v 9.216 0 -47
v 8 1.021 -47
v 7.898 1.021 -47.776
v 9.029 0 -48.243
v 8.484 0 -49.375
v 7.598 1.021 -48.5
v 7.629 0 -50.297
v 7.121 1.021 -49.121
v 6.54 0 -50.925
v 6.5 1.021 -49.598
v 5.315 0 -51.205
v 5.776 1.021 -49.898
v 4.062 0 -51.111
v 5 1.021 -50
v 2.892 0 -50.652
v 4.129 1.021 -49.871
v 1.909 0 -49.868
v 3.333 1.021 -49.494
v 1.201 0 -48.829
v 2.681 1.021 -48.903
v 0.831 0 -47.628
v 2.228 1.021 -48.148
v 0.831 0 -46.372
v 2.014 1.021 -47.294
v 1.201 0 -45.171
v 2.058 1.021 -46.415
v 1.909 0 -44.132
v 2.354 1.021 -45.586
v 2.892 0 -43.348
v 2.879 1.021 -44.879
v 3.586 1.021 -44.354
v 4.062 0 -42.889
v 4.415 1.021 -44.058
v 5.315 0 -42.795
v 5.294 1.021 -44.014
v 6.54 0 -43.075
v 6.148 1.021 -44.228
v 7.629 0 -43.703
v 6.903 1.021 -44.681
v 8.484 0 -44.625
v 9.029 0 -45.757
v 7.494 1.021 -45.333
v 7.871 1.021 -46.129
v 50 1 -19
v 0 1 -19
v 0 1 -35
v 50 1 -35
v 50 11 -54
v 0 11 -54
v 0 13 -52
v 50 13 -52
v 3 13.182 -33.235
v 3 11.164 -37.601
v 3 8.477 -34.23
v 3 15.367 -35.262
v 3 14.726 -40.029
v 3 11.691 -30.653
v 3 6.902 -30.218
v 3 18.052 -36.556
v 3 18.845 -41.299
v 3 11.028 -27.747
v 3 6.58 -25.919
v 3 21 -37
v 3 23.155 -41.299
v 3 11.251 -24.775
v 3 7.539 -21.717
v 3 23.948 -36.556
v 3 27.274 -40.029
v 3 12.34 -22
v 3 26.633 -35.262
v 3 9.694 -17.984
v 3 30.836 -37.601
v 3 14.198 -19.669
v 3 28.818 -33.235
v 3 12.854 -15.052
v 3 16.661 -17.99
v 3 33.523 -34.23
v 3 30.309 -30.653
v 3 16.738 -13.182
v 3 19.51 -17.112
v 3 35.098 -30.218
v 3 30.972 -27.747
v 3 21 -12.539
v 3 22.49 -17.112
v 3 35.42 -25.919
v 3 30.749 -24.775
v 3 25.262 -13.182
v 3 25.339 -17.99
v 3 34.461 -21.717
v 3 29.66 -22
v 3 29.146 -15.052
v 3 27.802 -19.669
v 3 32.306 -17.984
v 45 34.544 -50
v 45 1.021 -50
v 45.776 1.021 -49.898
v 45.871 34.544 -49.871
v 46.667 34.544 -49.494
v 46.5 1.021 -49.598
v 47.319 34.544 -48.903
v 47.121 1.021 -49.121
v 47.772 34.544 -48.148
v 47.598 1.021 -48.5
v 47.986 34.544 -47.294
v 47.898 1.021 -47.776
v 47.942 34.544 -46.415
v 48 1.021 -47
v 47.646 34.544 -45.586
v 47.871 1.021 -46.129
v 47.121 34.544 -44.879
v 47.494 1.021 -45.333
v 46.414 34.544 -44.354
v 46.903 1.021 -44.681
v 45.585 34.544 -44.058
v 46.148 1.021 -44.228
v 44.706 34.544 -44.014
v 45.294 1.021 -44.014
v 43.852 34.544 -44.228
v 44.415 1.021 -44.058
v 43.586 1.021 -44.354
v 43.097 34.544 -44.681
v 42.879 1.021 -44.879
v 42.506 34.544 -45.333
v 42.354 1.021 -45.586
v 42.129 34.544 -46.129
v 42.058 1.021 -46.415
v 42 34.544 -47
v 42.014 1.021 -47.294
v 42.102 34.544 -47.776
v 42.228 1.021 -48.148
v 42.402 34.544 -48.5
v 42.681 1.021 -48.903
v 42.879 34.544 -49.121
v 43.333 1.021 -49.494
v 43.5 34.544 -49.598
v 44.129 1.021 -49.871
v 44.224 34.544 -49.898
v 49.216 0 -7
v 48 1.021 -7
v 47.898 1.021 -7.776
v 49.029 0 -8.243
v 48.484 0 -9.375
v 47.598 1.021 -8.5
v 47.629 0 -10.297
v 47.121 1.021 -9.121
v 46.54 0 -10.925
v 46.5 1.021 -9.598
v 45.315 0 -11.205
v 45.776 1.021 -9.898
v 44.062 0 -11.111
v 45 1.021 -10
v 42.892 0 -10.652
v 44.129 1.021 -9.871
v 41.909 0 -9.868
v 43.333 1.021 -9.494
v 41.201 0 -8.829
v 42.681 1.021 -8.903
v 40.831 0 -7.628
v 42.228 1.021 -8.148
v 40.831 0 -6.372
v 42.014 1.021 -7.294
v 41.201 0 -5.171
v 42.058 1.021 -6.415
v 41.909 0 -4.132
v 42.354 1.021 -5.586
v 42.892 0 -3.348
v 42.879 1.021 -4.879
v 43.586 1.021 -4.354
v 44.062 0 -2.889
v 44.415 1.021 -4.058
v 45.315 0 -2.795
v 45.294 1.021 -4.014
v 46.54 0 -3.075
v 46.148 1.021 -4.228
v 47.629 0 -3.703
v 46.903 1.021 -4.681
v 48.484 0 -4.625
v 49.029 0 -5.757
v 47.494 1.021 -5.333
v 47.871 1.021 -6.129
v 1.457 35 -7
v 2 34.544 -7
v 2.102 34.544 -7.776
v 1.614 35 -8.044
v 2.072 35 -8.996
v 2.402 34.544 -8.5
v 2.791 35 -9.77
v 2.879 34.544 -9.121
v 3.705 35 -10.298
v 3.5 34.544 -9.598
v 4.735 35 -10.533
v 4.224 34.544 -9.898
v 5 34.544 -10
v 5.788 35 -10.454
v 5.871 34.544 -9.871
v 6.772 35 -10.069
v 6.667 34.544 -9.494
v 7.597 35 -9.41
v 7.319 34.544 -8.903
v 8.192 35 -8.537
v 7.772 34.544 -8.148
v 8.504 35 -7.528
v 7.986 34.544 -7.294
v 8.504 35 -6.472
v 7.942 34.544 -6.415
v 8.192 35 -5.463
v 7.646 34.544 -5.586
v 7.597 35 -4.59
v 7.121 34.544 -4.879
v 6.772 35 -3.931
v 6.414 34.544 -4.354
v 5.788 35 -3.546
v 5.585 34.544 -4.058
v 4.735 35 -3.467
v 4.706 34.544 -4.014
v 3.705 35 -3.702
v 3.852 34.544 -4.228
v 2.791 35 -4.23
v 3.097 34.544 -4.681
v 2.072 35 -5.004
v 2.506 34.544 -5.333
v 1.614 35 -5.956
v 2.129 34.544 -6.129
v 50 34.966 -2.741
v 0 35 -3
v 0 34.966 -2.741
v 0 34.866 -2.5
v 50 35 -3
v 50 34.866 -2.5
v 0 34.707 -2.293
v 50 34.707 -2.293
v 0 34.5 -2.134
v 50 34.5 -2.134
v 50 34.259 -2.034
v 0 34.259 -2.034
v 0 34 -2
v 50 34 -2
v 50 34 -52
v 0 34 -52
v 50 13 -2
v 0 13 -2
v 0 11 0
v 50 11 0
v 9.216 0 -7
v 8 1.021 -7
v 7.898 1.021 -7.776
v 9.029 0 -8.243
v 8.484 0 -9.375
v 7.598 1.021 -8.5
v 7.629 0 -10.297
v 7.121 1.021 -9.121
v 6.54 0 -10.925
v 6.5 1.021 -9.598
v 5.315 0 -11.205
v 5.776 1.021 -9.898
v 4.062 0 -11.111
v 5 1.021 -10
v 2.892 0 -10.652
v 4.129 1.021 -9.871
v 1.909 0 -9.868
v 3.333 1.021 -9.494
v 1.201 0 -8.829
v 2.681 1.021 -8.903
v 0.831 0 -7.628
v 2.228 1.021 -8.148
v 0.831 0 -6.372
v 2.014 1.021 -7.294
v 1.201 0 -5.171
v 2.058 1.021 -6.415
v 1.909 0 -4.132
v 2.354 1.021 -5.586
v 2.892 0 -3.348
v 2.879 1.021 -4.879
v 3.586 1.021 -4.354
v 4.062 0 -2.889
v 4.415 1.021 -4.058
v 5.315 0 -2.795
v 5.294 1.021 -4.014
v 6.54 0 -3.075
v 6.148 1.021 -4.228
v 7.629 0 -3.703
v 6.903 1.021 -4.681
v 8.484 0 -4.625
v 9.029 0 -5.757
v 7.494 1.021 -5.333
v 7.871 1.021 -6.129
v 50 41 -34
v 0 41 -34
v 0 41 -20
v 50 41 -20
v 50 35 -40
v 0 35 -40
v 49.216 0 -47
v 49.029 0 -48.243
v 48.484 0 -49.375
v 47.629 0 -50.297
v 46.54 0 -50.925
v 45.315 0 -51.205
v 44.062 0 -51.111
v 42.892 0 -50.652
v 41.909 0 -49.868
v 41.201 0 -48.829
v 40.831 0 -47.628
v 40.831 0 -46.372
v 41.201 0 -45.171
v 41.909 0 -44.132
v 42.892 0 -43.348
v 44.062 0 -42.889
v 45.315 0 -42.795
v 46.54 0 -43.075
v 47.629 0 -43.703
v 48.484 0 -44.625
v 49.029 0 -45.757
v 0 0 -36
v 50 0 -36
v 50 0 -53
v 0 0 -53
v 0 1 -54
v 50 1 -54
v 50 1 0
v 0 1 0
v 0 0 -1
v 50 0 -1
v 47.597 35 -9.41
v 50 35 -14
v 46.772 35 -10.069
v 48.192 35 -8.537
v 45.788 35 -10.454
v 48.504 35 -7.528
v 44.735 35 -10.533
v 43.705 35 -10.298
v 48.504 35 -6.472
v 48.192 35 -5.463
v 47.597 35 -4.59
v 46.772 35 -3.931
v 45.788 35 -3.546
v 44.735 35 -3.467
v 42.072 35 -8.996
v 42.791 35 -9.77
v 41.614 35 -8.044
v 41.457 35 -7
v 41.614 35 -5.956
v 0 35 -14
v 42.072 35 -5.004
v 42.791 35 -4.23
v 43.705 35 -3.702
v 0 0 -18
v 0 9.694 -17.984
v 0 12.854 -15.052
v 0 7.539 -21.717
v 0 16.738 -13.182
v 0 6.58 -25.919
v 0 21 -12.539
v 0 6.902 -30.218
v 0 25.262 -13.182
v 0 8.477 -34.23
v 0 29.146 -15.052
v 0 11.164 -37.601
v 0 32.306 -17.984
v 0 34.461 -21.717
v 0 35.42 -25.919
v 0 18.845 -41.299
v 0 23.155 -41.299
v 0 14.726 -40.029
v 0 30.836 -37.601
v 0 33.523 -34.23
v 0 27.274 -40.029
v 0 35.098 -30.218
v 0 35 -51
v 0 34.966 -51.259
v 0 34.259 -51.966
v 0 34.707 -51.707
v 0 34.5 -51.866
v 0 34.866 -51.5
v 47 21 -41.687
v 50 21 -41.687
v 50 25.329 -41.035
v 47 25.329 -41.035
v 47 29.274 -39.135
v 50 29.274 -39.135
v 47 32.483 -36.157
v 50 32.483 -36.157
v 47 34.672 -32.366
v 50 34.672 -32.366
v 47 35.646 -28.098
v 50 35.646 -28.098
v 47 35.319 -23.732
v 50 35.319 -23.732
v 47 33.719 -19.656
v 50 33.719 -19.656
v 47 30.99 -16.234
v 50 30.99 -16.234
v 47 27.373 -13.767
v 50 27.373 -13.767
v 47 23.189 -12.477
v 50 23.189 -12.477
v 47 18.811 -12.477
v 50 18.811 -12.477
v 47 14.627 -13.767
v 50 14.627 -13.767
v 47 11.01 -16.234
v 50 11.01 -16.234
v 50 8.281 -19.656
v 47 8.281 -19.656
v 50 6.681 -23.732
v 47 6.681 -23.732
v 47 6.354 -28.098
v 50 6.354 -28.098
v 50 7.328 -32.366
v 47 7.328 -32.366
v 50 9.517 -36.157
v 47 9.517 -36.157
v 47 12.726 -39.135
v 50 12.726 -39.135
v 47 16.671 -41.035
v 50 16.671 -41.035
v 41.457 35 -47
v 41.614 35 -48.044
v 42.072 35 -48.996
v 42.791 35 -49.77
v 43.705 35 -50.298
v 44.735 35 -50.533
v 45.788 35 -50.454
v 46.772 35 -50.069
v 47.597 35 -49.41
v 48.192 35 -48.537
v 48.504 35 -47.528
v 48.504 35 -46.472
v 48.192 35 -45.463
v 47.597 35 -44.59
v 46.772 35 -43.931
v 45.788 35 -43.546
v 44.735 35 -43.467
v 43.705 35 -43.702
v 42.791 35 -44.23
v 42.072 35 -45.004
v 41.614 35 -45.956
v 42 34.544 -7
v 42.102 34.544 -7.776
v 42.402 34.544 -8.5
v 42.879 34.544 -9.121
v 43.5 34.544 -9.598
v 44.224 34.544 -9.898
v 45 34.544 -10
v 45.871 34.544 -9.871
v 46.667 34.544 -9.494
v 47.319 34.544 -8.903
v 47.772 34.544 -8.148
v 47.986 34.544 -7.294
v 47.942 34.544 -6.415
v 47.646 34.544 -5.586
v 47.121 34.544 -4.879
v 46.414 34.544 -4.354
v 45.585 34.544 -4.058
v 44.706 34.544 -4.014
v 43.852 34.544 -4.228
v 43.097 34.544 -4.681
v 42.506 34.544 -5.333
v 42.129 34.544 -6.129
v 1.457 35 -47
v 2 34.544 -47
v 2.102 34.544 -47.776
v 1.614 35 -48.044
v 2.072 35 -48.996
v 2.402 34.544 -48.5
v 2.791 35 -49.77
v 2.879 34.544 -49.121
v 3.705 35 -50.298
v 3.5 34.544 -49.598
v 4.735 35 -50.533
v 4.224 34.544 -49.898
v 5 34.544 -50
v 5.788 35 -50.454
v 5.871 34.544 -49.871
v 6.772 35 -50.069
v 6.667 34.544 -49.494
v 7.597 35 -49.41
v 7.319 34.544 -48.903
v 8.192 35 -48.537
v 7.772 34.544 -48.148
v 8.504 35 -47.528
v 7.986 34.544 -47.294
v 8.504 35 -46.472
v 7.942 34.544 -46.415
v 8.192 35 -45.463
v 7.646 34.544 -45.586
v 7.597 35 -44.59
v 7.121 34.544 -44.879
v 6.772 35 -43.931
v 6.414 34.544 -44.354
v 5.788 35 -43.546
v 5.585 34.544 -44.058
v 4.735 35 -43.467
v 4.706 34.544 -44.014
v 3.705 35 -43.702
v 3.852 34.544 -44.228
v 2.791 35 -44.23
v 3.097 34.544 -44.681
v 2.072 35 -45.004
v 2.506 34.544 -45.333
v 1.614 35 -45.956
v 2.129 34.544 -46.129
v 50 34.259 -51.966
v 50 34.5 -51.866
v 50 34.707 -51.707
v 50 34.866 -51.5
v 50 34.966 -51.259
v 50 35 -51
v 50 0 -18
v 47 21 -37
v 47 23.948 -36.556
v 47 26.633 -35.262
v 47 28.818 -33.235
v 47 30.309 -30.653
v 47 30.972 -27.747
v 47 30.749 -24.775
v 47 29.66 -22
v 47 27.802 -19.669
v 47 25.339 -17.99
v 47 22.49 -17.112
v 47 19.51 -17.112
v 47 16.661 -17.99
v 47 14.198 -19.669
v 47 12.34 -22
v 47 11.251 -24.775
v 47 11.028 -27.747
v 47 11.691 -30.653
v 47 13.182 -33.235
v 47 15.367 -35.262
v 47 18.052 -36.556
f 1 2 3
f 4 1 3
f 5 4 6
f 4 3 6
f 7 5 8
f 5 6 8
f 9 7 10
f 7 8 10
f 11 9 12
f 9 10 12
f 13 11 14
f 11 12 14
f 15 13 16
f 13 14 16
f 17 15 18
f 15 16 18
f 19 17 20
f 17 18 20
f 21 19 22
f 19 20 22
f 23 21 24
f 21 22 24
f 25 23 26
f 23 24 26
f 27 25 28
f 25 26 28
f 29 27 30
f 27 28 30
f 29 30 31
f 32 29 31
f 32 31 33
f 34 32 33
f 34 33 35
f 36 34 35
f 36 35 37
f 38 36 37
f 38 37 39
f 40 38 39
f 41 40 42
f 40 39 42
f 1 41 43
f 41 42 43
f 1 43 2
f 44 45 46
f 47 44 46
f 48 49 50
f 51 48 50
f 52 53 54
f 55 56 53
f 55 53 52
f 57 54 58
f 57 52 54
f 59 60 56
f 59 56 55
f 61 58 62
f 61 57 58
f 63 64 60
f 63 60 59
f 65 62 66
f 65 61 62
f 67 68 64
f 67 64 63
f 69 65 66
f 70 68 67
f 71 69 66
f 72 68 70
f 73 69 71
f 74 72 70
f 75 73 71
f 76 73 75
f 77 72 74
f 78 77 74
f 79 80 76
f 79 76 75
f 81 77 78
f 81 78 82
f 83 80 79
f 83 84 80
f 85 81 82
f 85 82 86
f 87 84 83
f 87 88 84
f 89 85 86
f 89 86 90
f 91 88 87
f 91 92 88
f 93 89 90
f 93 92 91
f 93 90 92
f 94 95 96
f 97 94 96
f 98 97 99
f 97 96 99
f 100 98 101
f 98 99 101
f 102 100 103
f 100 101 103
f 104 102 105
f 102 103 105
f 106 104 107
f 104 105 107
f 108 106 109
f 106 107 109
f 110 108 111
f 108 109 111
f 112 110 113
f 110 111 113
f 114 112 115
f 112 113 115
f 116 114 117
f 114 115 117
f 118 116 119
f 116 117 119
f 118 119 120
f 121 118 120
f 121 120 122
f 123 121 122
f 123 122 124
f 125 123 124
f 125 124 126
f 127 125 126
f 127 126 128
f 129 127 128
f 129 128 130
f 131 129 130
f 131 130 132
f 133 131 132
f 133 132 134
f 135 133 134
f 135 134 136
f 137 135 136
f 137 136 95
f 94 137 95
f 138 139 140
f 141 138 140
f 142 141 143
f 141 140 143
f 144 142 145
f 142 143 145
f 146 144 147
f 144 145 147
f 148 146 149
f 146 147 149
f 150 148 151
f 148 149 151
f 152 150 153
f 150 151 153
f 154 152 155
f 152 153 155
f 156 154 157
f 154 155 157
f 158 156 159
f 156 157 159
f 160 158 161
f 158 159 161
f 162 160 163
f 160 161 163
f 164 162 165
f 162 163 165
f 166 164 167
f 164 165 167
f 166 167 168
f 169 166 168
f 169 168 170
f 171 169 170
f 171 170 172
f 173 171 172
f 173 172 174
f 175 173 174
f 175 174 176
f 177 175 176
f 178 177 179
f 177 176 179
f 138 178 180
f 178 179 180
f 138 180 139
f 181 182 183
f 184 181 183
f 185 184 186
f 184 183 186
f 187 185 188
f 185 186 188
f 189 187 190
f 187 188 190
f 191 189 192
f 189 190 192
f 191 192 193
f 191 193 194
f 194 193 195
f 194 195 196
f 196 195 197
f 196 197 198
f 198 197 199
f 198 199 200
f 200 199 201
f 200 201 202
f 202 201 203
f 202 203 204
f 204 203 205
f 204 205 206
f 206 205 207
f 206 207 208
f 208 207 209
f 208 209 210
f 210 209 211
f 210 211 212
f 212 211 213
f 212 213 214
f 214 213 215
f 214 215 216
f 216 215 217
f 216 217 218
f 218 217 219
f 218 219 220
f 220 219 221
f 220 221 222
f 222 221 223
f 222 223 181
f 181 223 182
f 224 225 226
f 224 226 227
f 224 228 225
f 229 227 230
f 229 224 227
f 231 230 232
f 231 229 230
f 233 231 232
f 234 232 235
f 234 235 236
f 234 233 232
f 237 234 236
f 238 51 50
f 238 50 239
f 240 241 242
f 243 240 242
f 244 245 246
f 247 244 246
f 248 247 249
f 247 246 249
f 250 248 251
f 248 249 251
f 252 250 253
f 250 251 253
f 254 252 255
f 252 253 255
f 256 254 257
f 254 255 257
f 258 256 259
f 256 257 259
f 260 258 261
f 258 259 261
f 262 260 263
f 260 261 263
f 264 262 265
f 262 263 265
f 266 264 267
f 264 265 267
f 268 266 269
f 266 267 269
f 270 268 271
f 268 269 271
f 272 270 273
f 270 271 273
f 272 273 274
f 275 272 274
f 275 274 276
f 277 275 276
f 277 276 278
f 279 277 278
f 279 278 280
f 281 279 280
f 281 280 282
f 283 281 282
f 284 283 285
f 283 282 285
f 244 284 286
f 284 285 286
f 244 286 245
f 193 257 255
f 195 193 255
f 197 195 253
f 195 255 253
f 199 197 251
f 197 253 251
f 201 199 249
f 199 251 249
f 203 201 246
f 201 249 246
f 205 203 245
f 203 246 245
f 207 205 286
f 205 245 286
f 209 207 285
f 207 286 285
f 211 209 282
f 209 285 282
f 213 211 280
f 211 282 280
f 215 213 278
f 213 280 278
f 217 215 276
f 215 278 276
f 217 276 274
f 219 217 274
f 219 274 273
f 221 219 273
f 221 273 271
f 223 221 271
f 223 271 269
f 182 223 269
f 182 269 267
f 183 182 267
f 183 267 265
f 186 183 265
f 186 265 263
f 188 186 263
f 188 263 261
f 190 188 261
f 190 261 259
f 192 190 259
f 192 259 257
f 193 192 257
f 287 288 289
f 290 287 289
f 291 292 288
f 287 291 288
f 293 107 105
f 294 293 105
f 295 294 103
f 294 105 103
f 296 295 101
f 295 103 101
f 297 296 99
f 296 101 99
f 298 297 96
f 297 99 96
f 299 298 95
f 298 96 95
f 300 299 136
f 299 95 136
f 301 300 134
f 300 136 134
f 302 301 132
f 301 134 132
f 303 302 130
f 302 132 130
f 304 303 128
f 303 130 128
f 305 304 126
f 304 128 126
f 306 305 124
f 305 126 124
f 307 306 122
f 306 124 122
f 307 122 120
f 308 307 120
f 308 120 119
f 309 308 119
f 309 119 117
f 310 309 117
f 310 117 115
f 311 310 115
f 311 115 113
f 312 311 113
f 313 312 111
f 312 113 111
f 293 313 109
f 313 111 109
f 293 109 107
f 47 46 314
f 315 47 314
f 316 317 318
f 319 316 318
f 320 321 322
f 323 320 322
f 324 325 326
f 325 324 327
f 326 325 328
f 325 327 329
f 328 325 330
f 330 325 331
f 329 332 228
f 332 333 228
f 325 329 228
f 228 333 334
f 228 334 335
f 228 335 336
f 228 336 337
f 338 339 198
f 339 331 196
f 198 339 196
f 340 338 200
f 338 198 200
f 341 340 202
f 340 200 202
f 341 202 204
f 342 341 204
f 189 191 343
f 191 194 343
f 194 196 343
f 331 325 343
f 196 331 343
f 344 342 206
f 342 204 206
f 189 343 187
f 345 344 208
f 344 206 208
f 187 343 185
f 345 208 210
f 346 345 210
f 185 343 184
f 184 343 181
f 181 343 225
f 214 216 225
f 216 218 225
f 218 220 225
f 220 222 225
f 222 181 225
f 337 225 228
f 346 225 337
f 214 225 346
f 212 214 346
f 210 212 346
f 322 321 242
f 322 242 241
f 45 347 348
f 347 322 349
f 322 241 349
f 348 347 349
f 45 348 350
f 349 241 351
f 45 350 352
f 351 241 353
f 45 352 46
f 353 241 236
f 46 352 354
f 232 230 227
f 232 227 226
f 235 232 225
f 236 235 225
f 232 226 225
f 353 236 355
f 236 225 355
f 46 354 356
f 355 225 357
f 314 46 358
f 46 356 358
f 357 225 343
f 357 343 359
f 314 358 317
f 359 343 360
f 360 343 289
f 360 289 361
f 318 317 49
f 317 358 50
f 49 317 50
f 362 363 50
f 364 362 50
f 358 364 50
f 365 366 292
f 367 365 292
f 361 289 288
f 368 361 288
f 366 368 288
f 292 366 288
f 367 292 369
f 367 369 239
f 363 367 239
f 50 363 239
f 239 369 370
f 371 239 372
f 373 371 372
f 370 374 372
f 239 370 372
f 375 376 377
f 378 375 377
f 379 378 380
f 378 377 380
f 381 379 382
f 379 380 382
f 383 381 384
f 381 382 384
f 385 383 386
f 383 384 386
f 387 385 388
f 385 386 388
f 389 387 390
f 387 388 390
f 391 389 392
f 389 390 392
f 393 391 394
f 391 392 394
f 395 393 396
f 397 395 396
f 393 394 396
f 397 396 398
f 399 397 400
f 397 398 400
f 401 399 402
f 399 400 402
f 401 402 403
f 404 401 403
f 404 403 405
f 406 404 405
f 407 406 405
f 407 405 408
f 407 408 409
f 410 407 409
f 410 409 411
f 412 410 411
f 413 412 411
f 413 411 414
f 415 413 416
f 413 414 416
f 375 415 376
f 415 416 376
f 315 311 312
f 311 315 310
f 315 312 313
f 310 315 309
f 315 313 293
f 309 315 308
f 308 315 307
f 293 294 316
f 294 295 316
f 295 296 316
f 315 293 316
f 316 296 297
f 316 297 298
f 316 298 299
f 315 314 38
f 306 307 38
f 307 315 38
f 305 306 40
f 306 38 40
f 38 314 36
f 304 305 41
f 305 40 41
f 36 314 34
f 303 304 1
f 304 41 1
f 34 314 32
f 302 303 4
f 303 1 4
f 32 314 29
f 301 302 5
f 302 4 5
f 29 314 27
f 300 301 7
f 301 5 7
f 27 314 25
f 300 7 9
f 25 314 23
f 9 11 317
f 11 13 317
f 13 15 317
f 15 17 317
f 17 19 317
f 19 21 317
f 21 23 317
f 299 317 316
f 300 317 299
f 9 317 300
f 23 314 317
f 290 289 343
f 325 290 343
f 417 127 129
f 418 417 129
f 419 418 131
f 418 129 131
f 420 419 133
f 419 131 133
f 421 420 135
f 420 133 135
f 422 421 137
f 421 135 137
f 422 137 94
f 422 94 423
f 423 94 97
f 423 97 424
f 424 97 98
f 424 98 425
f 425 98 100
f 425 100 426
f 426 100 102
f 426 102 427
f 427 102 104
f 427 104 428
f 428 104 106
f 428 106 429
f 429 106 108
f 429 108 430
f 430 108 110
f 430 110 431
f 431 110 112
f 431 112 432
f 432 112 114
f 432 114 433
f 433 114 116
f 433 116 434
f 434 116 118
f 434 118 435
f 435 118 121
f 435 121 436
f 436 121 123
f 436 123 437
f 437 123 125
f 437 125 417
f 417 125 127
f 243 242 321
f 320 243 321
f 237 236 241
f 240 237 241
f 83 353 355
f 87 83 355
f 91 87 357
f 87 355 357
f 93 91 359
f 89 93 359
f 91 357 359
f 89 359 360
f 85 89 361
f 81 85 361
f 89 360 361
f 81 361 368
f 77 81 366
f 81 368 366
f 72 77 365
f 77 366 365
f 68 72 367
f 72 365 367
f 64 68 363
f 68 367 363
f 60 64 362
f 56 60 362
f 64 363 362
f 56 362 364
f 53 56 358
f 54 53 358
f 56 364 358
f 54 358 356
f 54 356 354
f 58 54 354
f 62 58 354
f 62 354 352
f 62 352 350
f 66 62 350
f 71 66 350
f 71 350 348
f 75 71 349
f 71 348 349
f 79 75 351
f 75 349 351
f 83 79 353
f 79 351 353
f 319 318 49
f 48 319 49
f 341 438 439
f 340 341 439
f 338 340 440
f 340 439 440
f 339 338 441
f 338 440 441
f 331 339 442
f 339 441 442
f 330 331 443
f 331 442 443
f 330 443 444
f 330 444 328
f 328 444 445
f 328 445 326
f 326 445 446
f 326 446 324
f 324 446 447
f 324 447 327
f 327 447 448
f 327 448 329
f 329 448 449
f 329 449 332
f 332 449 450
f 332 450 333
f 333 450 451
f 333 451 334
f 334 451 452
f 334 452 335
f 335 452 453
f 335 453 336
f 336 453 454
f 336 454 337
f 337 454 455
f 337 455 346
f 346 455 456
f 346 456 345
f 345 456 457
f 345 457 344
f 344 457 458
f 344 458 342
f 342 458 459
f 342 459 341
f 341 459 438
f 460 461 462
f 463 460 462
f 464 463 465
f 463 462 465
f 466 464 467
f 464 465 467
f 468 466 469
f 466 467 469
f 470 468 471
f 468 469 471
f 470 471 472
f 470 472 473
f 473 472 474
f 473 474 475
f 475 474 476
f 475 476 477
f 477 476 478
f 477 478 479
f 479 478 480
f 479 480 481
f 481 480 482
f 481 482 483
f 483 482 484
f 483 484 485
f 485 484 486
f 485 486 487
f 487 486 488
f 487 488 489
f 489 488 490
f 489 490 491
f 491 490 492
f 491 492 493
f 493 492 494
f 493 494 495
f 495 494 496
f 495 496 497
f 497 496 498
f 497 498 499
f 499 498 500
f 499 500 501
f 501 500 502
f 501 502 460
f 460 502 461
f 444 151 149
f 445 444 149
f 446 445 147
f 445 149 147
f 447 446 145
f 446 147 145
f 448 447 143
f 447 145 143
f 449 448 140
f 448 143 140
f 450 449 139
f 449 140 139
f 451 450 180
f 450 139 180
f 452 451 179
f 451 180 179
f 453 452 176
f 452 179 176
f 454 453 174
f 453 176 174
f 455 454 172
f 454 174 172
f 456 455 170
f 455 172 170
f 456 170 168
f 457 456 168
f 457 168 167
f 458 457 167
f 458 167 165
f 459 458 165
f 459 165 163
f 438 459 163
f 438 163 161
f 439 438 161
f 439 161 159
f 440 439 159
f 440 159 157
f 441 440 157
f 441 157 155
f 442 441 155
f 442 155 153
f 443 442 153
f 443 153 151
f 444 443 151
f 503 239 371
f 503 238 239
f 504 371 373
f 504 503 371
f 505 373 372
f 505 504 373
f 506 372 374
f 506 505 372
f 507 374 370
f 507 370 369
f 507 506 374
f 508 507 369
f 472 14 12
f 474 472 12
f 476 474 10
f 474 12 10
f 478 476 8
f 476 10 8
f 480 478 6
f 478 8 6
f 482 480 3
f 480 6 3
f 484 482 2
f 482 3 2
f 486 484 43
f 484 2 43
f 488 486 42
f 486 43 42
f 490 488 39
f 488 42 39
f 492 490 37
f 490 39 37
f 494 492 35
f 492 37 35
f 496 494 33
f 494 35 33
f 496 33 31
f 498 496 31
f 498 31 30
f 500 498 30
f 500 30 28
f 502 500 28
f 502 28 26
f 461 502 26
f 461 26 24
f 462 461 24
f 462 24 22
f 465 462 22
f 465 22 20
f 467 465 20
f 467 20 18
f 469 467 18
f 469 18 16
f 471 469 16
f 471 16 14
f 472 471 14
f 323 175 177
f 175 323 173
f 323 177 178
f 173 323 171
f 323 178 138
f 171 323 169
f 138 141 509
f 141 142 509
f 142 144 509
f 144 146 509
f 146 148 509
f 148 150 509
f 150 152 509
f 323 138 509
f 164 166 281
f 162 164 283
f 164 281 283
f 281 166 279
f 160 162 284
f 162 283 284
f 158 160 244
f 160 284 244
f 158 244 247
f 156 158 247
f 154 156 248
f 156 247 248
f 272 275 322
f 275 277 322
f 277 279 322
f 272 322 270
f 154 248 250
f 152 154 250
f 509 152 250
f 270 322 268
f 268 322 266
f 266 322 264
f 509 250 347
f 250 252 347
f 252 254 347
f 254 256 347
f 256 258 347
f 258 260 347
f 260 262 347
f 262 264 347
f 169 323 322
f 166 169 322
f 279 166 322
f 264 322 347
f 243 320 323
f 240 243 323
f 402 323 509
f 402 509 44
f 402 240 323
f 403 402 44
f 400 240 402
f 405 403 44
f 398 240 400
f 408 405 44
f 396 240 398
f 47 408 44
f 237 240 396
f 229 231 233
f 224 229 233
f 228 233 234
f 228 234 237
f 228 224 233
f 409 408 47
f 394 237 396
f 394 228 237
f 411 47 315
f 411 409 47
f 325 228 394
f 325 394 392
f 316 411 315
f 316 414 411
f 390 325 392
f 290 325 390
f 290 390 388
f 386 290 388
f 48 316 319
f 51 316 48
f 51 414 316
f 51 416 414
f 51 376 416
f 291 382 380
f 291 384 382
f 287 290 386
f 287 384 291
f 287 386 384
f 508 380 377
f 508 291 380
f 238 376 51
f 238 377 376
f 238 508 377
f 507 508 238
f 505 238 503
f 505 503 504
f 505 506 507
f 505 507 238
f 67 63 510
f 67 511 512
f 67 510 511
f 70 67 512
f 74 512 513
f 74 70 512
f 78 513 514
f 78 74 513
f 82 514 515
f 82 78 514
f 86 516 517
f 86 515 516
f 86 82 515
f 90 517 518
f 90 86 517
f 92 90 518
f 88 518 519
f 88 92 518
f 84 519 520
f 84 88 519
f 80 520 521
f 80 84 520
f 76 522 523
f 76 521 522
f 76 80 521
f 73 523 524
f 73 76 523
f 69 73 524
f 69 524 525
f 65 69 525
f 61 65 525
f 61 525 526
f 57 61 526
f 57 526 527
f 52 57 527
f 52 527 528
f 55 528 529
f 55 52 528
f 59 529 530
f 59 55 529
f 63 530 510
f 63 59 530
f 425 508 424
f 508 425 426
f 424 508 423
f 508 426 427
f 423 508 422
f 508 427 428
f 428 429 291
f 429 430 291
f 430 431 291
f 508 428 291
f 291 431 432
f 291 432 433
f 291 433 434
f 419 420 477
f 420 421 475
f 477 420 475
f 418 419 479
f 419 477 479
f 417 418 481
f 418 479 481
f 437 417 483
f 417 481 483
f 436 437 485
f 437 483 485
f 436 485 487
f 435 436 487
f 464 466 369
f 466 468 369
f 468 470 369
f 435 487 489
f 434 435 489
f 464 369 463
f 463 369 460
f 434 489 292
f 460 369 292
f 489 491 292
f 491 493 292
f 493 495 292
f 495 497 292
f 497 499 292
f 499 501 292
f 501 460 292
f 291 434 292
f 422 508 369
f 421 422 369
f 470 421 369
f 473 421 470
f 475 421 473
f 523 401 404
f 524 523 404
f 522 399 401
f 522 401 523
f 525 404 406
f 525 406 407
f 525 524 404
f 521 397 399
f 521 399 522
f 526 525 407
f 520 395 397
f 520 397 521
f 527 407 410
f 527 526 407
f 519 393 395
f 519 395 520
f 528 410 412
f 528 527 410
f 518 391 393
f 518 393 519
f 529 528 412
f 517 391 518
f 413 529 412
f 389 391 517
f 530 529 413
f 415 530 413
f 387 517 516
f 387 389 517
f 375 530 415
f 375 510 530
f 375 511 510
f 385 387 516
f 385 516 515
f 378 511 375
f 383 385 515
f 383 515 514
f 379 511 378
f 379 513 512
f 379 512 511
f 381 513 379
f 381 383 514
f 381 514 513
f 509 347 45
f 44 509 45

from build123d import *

# Parameters (mm, degrees)
SKETCH1_R                                         = 10
BOSS_EXTRUDE1_DEPTH                               = 50
FILLET1_R                                         = 1
SKETCH2_R                                         = 3
CUT_EXTRUDE1_DEPTH                                = 50
SKETCH3_R                                         = 3
CUT_EXTRUDE2_DEPTH                                = 85.243694126
CSK_FOR_8_FLAT_HEAD_MACHINE_SCREW_100_D           = 4.4958
CSK_FOR_8_FLAT_HEAD_MACHINE_SCREW_100_CSINK_D     = 8.4328
CSK_FOR_8_FLAT_HEAD_MACHINE_SCREW_100_CSINK_ANGLE = 100
CSK_FOR_6_FLAT_HEAD_MACHINE_SCREW_100_D           = 3.7973
CSK_FOR_6_FLAT_HEAD_MACHINE_SCREW_100_CSINK_D     = 7.0866
CSK_FOR_6_FLAT_HEAD_MACHINE_SCREW_100_CSINK_ANGLE = 100
SKETCH14_R                                        = 14.687199229
CUT_EXTRUDE3_DEPTH                                = 3
SKETCH15_R                                        = 14.460805981
CUT_EXTRUDE4_DEPTH                                = 3


with BuildPart() as part:
    # Sketch1 → Boss-Extrude1 (new body)
    with BuildSketch(Plane(origin=(0, 0, 0), x_dir=(0, 0, -1), z_dir=(1, 0, 0))):
        Polygon((53, 0), (54, 1), (54, 11), (52, 13), (52, 35), (40, 35), (34, 41), (20, 41), (14, 35), (2, 35), (2, 13), (0, 11), (0, 1), (1, 0), (18, 0), (19, 1), (35, 1), (36, 0), align=None)
        with Locations((27, 21)):
            Circle(SKETCH1_R, mode=Mode.SUBTRACT)
    extrude(amount=BOSS_EXTRUDE1_DEPTH)

    # Fillet1
    fillet1_edges = [part.edges().sort_by_distance(p)[0] for p in [
        (25, 35, -2),
        (25, 35, -52),
    ]]
    fillet(fillet1_edges, radius=FILLET1_R)

    # Sketch2 → Cut-Extrude1 (cut)
    with BuildSketch(Plane.XZ):
        with Locations(Location((5, -7, 0), (0, 0, 270))):
            Circle(SKETCH2_R)
        with Locations(Location((45, -7, 0), (0, 0, 270))):
            Circle(SKETCH2_R)
    extrude(amount=-CUT_EXTRUDE1_DEPTH, mode=Mode.SUBTRACT)

    # Sketch3 → Cut-Extrude2 (cut, through all)
    with BuildSketch(Plane.XZ):
        with Locations(Location((5, -47, 0), (0, 0, 270))):
            Circle(SKETCH3_R)
        with Locations(Location((45, -47, 0), (0, 0, 270))):
            Circle(SKETCH3_R)
    extrude(amount=-CUT_EXTRUDE2_DEPTH, mode=Mode.SUBTRACT)

    # CSK for #8 Flat Head Machine Screw (100)1 (through all)
    with Locations(Plane(origin=(0, 0, 0), x_dir=(-1, 0, 0), z_dir=(0, -1, 0))):
        with Locations((-45, 7), (-5, 7), (-5, 47), (-45, 47)):
            CounterSinkHole(CSK_FOR_8_FLAT_HEAD_MACHINE_SCREW_100_D / 2, CSK_FOR_8_FLAT_HEAD_MACHINE_SCREW_100_CSINK_D / 2, counter_sink_angle=CSK_FOR_8_FLAT_HEAD_MACHINE_SCREW_100_CSINK_ANGLE)

    # CSK for #6 Flat Head Machine Screw (100)1 (through all)
    with Locations(Plane(origin=(0, 35, 0), x_dir=(1, 0, 0), z_dir=(0, 1, 0))):
        with Locations((5, 47), (45, 47), (45, 7), (5, 7)):
            CounterSinkHole(CSK_FOR_6_FLAT_HEAD_MACHINE_SCREW_100_D / 2, CSK_FOR_6_FLAT_HEAD_MACHINE_SCREW_100_CSINK_D / 2, counter_sink_angle=CSK_FOR_6_FLAT_HEAD_MACHINE_SCREW_100_CSINK_ANGLE)

    # Sketch14 → Cut-Extrude3 (cut)
    with BuildSketch(Plane(origin=(50, 0, 0), x_dir=(0, 0, -1), z_dir=(1, 0, 0))):
        with Locations((27, 21)):
            Circle(SKETCH14_R)
    extrude(amount=-CUT_EXTRUDE3_DEPTH, mode=Mode.SUBTRACT)

    # Sketch15 → Cut-Extrude4 (cut)
    with BuildSketch(Plane.ZY):
        with Locations((-27, 21)):
            Circle(SKETCH15_R)
    extrude(amount=-CUT_EXTRUDE4_DEPTH, mode=Mode.SUBTRACT)


solid = part.part
